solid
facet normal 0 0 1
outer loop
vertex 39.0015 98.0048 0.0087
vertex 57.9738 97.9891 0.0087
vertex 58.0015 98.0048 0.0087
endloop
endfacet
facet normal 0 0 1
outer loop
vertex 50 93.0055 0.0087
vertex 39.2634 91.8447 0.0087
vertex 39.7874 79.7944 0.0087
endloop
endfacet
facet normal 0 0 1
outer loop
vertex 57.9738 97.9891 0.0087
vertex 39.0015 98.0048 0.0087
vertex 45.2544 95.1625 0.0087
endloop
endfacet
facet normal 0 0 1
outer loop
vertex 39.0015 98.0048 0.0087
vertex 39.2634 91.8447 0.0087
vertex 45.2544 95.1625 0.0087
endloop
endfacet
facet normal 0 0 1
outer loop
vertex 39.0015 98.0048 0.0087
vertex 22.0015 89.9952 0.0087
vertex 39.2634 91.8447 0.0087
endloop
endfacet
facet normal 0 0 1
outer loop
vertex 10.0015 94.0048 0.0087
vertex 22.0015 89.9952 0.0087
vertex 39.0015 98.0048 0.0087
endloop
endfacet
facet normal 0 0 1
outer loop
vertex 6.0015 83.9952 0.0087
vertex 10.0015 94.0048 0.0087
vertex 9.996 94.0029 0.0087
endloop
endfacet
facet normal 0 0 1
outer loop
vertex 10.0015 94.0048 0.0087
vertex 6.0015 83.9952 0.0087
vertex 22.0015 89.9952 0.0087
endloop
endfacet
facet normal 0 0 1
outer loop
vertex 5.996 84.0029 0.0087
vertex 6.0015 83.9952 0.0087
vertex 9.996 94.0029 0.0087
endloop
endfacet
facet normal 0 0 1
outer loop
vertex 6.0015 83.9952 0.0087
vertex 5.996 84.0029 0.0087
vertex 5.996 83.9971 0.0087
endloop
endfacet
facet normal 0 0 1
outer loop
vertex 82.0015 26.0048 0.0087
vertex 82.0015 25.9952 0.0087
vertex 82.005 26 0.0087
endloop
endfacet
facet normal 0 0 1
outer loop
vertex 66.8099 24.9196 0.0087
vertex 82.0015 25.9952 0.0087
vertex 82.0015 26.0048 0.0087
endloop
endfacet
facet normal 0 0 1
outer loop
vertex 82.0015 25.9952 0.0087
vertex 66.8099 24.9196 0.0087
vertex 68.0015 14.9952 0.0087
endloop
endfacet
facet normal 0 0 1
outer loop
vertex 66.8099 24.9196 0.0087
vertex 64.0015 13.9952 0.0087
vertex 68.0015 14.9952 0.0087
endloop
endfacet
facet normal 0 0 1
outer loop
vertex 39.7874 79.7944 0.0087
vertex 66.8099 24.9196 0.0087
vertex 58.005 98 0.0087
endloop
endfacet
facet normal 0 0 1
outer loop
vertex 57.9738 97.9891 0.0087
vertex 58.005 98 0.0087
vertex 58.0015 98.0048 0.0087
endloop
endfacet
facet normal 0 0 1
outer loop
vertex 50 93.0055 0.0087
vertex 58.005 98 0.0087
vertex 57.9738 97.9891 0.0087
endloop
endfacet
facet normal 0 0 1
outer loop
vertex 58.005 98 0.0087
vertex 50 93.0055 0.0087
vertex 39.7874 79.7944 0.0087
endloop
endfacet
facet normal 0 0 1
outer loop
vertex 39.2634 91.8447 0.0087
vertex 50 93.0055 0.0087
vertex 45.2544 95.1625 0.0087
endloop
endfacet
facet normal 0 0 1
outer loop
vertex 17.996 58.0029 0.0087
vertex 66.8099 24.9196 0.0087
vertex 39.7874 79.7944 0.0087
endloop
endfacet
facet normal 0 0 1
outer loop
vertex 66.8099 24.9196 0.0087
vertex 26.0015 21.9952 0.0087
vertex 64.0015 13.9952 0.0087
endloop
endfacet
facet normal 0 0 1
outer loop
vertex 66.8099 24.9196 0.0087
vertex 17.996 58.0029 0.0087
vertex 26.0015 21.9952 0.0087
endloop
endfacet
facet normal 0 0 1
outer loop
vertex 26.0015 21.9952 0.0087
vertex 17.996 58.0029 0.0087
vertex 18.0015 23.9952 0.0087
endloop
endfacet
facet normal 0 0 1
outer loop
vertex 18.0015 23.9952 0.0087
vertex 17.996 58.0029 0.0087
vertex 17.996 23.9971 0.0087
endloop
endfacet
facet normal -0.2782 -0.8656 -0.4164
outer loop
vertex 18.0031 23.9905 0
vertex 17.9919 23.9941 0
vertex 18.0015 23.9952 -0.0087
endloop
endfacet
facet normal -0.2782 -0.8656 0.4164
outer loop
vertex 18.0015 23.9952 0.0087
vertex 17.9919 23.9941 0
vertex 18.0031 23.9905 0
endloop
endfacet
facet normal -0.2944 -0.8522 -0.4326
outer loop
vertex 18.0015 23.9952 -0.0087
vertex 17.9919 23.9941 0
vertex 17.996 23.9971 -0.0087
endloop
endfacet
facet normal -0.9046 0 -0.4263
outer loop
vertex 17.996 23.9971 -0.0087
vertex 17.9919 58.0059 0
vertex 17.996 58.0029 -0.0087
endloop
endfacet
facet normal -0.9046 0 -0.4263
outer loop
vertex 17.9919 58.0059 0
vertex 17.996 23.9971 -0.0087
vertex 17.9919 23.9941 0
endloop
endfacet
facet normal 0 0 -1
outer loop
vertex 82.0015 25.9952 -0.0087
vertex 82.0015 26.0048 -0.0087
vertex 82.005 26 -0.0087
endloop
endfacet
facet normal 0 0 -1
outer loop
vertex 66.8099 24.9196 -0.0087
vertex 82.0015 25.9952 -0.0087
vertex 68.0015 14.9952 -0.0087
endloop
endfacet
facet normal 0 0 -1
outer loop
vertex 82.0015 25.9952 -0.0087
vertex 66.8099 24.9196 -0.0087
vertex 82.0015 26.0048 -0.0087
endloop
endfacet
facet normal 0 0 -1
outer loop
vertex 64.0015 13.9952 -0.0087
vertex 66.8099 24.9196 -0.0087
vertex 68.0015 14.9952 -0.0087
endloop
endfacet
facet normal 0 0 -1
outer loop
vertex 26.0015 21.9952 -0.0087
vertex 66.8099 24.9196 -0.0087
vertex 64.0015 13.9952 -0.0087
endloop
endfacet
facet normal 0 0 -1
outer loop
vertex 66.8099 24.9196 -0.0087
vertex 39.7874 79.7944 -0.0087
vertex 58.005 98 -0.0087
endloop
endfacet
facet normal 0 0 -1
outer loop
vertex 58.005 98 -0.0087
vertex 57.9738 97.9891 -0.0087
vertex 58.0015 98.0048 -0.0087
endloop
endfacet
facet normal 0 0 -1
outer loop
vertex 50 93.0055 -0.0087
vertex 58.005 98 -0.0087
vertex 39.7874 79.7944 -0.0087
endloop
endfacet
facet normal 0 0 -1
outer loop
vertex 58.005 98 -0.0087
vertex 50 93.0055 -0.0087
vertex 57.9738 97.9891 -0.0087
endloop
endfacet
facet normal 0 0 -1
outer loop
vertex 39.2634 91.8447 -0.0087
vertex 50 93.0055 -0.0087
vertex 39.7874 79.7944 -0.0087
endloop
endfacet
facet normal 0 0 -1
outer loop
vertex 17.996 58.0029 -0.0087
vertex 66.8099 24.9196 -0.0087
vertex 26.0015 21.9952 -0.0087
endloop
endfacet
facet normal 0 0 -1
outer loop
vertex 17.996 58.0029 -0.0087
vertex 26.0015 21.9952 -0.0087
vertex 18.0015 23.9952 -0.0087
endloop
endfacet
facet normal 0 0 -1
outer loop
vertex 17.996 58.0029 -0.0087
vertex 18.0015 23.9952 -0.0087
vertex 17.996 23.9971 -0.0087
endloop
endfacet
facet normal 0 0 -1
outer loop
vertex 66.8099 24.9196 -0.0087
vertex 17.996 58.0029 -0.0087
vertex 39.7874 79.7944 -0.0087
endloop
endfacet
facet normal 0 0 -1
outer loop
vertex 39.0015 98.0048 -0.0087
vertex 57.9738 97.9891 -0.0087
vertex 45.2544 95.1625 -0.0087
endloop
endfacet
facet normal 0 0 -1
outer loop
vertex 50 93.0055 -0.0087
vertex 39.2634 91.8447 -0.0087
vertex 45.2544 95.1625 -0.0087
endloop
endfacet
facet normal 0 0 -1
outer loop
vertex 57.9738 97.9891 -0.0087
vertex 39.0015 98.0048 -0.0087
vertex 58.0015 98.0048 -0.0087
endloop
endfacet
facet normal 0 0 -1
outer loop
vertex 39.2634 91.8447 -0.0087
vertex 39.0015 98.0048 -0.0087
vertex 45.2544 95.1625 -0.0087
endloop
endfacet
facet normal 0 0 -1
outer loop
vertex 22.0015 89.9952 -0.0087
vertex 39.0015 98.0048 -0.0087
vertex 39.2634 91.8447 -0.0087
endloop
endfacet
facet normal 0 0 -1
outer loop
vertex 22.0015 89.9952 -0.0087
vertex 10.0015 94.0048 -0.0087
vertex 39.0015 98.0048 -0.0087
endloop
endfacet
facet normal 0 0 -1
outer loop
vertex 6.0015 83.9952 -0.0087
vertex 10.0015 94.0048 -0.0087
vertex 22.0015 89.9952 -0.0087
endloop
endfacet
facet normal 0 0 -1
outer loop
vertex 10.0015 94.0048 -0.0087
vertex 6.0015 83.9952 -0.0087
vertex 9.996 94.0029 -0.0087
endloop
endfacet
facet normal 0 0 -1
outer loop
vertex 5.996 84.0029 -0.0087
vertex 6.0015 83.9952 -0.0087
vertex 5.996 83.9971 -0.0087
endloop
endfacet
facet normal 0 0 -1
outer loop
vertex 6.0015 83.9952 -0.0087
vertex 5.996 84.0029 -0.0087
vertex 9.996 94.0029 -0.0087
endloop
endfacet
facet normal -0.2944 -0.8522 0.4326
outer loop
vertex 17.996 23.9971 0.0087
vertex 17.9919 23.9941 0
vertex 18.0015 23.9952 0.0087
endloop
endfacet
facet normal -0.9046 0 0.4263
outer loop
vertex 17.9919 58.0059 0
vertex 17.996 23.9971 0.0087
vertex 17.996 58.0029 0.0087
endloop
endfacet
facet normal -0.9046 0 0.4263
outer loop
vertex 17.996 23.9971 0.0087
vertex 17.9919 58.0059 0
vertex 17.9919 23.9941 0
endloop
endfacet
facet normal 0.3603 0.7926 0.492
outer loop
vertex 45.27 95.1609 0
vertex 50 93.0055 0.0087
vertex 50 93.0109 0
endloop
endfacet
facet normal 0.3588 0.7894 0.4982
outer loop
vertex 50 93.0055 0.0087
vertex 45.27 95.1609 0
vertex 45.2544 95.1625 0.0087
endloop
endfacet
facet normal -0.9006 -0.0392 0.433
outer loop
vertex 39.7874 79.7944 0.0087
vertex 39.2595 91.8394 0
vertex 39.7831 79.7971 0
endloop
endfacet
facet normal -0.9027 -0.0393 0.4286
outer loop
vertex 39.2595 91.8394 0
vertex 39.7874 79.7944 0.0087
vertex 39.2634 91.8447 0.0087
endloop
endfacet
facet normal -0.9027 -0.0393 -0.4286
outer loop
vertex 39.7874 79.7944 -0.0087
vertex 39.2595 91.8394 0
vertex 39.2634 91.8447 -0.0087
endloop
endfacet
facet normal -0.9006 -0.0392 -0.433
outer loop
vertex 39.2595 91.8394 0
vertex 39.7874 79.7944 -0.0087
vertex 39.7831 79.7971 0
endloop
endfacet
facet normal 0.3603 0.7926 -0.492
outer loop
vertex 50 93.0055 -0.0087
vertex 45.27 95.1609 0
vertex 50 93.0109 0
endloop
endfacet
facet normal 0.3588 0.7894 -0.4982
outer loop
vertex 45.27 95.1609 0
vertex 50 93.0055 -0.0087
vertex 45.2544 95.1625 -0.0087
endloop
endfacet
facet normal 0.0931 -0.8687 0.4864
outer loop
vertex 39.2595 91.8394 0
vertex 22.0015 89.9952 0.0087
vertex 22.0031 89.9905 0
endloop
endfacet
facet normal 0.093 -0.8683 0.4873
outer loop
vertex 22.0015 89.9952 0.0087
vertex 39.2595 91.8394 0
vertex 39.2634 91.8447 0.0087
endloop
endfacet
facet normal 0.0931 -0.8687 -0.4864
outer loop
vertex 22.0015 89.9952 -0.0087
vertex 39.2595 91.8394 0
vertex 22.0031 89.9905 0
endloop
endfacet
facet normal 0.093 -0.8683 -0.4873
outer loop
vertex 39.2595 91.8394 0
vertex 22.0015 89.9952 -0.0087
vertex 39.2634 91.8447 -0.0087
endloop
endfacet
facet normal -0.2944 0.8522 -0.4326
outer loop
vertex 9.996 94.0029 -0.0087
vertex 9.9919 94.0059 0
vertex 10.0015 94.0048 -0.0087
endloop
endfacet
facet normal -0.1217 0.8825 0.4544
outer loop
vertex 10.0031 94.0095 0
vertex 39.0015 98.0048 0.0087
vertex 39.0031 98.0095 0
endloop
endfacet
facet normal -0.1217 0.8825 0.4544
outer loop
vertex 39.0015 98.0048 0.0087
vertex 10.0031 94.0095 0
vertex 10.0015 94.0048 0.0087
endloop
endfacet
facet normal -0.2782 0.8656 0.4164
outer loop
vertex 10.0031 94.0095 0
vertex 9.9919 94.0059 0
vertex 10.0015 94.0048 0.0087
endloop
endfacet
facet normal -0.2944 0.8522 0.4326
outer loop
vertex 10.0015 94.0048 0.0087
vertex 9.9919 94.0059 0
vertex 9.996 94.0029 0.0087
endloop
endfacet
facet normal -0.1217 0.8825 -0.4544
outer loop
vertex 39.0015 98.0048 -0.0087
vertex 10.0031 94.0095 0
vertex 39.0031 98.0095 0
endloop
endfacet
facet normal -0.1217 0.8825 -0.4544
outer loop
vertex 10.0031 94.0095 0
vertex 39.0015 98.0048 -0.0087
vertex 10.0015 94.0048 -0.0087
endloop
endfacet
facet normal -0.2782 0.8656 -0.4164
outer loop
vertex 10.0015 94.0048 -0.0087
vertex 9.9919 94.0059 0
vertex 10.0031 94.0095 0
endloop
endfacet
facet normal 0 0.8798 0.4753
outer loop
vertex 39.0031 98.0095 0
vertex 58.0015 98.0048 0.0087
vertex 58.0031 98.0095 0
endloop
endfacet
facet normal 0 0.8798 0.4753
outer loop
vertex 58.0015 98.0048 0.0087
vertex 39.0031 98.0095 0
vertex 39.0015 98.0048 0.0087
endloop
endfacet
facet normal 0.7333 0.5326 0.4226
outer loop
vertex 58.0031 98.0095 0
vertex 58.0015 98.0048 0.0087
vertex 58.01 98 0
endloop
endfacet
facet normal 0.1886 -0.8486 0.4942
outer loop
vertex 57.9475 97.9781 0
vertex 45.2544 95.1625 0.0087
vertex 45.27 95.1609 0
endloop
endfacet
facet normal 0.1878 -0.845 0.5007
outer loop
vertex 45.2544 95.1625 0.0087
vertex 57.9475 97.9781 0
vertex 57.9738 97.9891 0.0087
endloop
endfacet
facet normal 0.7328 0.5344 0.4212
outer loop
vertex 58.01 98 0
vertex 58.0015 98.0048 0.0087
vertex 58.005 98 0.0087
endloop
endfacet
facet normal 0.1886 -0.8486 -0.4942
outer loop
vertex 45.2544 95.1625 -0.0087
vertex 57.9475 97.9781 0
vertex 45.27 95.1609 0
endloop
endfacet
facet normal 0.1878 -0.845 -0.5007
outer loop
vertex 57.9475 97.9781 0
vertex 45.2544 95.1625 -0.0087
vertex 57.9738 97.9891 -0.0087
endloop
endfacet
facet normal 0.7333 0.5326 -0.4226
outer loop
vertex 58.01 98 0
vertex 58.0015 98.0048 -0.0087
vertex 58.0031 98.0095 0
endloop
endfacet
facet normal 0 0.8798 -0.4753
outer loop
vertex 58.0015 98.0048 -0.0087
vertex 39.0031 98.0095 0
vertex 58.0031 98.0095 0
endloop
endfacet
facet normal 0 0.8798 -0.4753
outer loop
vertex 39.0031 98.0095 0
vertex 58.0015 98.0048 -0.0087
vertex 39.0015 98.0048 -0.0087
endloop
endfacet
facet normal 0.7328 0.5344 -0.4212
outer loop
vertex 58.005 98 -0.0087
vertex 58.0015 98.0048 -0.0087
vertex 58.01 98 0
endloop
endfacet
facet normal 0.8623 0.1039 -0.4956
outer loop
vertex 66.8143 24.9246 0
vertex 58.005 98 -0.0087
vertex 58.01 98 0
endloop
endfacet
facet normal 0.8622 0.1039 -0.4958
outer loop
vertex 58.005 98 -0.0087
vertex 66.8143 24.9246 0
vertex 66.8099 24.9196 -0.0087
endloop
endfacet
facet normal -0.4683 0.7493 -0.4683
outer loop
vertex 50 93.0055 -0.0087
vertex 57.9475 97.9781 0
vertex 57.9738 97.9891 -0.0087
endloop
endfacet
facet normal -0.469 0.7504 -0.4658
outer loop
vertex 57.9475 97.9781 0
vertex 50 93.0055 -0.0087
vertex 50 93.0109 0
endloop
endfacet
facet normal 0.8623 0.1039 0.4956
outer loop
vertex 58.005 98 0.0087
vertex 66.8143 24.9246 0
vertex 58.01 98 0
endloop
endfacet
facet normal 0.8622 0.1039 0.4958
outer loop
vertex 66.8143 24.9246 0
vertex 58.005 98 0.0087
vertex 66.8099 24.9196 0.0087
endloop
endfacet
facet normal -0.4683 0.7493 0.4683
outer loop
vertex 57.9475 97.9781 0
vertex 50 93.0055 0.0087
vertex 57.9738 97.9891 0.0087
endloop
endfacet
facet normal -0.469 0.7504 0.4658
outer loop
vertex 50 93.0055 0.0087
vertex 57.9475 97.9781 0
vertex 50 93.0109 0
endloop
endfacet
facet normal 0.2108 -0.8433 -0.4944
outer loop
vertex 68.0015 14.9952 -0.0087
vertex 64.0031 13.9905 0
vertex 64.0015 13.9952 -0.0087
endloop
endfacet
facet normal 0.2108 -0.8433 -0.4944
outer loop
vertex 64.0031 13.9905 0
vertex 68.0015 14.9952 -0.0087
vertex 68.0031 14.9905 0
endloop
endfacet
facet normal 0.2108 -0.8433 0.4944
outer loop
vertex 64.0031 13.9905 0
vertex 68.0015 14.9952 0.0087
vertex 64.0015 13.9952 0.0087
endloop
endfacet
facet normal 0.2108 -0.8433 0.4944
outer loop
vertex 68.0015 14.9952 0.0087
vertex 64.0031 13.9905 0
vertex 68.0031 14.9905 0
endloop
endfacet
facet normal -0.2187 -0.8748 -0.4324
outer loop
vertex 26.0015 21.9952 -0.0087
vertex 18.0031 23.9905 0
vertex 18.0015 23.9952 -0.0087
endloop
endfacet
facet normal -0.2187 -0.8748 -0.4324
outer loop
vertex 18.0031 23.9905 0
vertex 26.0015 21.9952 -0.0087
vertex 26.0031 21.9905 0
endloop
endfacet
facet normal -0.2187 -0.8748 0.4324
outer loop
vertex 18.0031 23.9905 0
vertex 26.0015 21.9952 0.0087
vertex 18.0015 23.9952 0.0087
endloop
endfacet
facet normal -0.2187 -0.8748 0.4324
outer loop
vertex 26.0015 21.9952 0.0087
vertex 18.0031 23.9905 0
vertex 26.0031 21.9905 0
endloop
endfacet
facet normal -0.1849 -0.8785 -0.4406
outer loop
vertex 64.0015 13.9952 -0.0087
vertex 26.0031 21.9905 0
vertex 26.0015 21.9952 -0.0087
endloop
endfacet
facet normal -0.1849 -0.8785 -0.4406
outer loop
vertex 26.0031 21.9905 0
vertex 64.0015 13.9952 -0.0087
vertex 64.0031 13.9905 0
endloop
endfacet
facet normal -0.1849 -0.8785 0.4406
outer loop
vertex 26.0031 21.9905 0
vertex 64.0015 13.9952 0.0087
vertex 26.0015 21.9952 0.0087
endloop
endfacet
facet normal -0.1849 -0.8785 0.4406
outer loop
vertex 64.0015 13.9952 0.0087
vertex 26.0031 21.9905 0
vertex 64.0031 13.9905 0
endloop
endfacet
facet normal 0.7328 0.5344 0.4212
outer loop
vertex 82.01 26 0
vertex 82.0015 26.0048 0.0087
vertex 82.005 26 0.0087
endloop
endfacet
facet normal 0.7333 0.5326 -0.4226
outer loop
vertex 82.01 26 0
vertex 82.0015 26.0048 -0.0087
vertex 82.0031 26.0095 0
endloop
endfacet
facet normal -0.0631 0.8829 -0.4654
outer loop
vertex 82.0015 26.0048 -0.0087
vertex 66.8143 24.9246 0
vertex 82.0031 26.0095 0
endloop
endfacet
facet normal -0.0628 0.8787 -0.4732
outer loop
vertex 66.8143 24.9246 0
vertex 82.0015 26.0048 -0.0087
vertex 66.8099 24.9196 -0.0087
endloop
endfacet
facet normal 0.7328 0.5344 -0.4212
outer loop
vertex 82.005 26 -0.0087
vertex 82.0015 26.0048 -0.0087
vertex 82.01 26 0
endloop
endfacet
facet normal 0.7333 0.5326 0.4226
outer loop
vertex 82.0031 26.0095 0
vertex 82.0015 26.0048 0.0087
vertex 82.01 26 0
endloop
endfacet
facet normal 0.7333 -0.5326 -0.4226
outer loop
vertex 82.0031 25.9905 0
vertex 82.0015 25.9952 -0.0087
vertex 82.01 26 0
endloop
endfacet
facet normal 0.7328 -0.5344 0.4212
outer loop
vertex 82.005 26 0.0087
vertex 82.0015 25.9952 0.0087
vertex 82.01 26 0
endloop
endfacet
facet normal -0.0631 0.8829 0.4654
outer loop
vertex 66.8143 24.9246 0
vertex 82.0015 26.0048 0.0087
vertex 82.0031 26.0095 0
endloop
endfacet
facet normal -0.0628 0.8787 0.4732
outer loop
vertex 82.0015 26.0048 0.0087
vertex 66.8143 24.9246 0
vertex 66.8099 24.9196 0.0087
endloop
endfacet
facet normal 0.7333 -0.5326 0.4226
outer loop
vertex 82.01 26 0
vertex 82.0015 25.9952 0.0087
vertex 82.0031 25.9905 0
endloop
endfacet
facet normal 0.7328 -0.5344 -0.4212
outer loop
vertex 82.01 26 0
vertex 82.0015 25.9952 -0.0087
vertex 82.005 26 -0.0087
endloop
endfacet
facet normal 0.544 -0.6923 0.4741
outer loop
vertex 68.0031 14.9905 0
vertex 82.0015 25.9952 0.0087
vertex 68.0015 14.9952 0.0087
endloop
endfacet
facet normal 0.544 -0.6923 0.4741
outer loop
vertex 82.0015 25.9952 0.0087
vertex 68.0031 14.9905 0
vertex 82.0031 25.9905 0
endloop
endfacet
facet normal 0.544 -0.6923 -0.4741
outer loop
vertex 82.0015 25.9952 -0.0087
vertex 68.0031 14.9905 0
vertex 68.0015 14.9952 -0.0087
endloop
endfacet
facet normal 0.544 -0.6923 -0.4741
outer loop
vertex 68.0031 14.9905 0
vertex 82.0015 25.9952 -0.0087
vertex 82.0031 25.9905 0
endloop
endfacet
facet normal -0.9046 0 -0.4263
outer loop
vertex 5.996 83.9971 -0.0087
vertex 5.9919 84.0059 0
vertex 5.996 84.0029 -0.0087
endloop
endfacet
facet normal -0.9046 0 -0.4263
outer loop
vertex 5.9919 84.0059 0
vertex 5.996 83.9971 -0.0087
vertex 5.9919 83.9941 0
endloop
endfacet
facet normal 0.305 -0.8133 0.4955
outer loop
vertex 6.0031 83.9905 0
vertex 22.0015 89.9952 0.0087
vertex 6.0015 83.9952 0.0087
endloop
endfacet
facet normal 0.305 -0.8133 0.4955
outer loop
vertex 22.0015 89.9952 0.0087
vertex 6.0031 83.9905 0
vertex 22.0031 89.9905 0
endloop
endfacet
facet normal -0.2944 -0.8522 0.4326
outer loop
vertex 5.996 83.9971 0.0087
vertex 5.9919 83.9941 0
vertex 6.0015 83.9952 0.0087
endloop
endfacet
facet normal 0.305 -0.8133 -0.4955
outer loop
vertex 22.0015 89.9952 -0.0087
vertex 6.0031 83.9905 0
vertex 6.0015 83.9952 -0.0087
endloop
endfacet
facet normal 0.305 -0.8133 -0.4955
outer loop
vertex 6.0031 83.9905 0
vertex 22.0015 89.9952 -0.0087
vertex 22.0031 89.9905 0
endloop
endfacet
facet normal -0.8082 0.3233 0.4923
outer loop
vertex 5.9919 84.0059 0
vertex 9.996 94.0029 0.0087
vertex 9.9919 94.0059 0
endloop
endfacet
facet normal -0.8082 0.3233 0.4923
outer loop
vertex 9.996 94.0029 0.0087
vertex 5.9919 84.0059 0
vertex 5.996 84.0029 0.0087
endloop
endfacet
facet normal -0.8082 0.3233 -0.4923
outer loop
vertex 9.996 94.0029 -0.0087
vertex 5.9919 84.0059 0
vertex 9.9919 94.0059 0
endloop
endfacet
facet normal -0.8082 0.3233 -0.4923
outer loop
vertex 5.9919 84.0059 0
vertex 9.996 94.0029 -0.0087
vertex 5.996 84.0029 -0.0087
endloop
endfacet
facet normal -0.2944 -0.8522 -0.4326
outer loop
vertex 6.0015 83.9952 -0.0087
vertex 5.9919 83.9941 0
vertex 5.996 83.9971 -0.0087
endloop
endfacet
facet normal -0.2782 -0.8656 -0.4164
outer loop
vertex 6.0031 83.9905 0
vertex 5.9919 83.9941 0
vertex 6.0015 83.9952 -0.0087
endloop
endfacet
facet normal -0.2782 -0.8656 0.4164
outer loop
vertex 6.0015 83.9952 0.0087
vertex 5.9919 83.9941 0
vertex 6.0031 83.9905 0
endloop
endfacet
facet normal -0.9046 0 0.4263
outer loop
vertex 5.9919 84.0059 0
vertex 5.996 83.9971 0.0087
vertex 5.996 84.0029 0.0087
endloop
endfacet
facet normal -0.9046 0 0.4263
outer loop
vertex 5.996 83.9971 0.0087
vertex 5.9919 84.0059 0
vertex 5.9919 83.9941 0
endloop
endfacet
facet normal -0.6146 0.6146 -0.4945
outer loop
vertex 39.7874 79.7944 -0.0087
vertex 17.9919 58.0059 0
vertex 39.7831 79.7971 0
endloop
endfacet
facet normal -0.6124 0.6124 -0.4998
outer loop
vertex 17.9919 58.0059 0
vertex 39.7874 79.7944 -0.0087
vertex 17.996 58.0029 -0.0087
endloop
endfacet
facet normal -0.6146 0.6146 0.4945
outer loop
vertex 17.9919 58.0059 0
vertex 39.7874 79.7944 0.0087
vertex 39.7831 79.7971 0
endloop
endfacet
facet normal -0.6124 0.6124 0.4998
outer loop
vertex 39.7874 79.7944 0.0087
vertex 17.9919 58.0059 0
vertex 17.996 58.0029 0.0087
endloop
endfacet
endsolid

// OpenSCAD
color([0.3519350680925015,0.6477014615427978,0.14125726454845833]) hull(){
    translate([18,24]) sphere(0.01);
    translate([44,47]) sphere(0.01);
    translate([18,58]) sphere(0.01);
}
color([0.23013900541024712,0.8285218163248013,0.9603761550286747]) hull(){
    translate([18,24]) sphere(0.01);
    translate([58,33]) sphere(0.01);
    translate([44,47]) sphere(0.01);
}
color([0.6050710034948523,0.017553655236826726,0.43262871278032167]) hull(){
    translate([58,33]) sphere(0.01);
    translate([42,29]) sphere(0.01);
    translate([44,47]) sphere(0.01);
}
color([0.2571490251669072,0.4480229944680496,0.14517873337393172]) hull(){
    translate([42,29]) sphere(0.01);
    translate([44,55]) sphere(0.01);
    translate([44,47]) sphere(0.01);
}
color([0.8405131005933094,0.9776834869331054,0.10300019528175153]) hull(){
    translate([42,29]) sphere(0.01);
    translate([39,98]) sphere(0.01);
    translate([50,93]) sphere(0.01);
}
color([0.998153073210626,0.8535026464000083,0.6855970549077809]) hull(){
    translate([42,29]) sphere(0.01);
    translate([50,93]) sphere(0.01);
    translate([44,47]) sphere(0.01);
}
color([0.7995005100691247,0.34047238184459006,0.1286635278612125]) hull(){
    translate([22,90]) sphere(0.01);
    translate([39,98]) sphere(0.01);
    translate([50,93]) sphere(0.01);
}
color([0.6020598448119898,0.9167847797194366,0.02081986636819022]) hull(){
    translate([22,90]) sphere(0.01);
    translate([10,94]) sphere(0.01);
    translate([39,98]) sphere(0.01);
}
color([0.9135118305629362,0.3823609034395232,0.42581309278619206]) hull(){
    translate([58,98]) sphere(0.01);
    translate([22,90]) sphere(0.01);
    translate([39,98]) sphere(0.01);
}
color([0.08967296065919184,0.0016857337534631478,0.31287848776698257]) hull(){
    translate([58,98]) sphere(0.01);
    translate([50,93]) sphere(0.01);
    translate([68,15]) sphere(0.01);
}
color([0.09731792302828757,0.364404074066101,0.8754307508322564]) hull(){
    translate([64,14]) sphere(0.01);
    translate([68,15]) sphere(0.01);
    translate([58,33]) sphere(0.01);
}
color([0.6967090939923642,0.5776053806129825,0.18685318159950626]) hull(){
    translate([64,14]) sphere(0.01);
    translate([58,33]) sphere(0.01);
    translate([42,29]) sphere(0.01);
}
color([0.9585806736472646,0.593334846568766,0.09927504601217696]) hull(){
    translate([26,22]) sphere(0.01);
    translate([18,24]) sphere(0.01);
    translate([58,33]) sphere(0.01);
}
color([0.19313665173925,0.6863688301261038,0.2093263356404984]) hull(){
    translate([26,22]) sphere(0.01);
    translate([58,33]) sphere(0.01);
    translate([42,29]) sphere(0.01);
}
color([0.2694340379225941,0.24598969558588324,0.16092298384524362]) hull(){
    translate([26,22]) sphere(0.01);
    translate([42,29]) sphere(0.01);
    translate([64,14]) sphere(0.01);
}
color([0.5102606956149307,0.431705445139412,0.38909399282504675]) hull(){
    translate([26,22]) sphere(0.01);
    translate([64,14]) sphere(0.01);
    translate([68,15]) sphere(0.01);
}
color([0.3194819673674283,0.6655357355223767,0.22692357675811492]) hull(){
    translate([82,26]) sphere(0.01);
    translate([26,22]) sphere(0.01);
    translate([64,14]) sphere(0.01);
}
color([0.9464906820257937,0.35776616524050997,0.9421064453260054]) hull(){
    translate([82,26]) sphere(0.01);
    translate([64,14]) sphere(0.01);
    translate([68,15]) sphere(0.01);
}
color([0.3792404853118415,0.27508202782836655,0.9368074710650367]) hull(){
    translate([58,98]) sphere(0.01);
    translate([68,15]) sphere(0.01);
    translate([44,55]) sphere(0.01);
}
color([0.7670397757471089,0.17483880300164423,0.7474114244696689]) hull(){
    translate([44,55]) sphere(0.01);
    translate([68,15]) sphere(0.01);
    translate([50,93]) sphere(0.01);
}
color([0.6015236368594579,0.5872808850844162,0.28390336255679416]) hull(){
    translate([58,98]) sphere(0.01);
    translate([44,55]) sphere(0.01);
    translate([50,93]) sphere(0.01);
}
color([0.5839405385485582,0.4048698908705002,0.6877557316706271]) hull(){
    translate([6,84]) sphere(0.01);
    translate([10,94]) sphere(0.01);
    translate([22,90]) sphere(0.01);
}
color([0.29310936231965135,0.08456113000314536,0.6409271470126323]) hull(){
    translate([6,84]) sphere(0.01);
    translate([22,90]) sphere(0.01);
    translate([39,98]) sphere(0.01);
}
color([0.38512246522478266,0.6162859510128613,0.407224705538046]) hull(){
    translate([18,58]) sphere(0.01);
    translate([44,47]) sphere(0.01);
    translate([44,55]) sphere(0.01);
}
color([0.6107800780239486,0.9541913078580654,0.09369719926319908]) hull(){
    translate([18,58]) sphere(0.01);
    translate([44,55]) sphere(0.01);
    translate([58,98]) sphere(0.01);
}
color([0.4396226851829427,0.9817497074141792,0.30111933510979894]) hull(){
    translate([18,58]) sphere(0.01);
    translate([58,98]) sphere(0.01);
    translate([68,15]) sphere(0.01);
}
